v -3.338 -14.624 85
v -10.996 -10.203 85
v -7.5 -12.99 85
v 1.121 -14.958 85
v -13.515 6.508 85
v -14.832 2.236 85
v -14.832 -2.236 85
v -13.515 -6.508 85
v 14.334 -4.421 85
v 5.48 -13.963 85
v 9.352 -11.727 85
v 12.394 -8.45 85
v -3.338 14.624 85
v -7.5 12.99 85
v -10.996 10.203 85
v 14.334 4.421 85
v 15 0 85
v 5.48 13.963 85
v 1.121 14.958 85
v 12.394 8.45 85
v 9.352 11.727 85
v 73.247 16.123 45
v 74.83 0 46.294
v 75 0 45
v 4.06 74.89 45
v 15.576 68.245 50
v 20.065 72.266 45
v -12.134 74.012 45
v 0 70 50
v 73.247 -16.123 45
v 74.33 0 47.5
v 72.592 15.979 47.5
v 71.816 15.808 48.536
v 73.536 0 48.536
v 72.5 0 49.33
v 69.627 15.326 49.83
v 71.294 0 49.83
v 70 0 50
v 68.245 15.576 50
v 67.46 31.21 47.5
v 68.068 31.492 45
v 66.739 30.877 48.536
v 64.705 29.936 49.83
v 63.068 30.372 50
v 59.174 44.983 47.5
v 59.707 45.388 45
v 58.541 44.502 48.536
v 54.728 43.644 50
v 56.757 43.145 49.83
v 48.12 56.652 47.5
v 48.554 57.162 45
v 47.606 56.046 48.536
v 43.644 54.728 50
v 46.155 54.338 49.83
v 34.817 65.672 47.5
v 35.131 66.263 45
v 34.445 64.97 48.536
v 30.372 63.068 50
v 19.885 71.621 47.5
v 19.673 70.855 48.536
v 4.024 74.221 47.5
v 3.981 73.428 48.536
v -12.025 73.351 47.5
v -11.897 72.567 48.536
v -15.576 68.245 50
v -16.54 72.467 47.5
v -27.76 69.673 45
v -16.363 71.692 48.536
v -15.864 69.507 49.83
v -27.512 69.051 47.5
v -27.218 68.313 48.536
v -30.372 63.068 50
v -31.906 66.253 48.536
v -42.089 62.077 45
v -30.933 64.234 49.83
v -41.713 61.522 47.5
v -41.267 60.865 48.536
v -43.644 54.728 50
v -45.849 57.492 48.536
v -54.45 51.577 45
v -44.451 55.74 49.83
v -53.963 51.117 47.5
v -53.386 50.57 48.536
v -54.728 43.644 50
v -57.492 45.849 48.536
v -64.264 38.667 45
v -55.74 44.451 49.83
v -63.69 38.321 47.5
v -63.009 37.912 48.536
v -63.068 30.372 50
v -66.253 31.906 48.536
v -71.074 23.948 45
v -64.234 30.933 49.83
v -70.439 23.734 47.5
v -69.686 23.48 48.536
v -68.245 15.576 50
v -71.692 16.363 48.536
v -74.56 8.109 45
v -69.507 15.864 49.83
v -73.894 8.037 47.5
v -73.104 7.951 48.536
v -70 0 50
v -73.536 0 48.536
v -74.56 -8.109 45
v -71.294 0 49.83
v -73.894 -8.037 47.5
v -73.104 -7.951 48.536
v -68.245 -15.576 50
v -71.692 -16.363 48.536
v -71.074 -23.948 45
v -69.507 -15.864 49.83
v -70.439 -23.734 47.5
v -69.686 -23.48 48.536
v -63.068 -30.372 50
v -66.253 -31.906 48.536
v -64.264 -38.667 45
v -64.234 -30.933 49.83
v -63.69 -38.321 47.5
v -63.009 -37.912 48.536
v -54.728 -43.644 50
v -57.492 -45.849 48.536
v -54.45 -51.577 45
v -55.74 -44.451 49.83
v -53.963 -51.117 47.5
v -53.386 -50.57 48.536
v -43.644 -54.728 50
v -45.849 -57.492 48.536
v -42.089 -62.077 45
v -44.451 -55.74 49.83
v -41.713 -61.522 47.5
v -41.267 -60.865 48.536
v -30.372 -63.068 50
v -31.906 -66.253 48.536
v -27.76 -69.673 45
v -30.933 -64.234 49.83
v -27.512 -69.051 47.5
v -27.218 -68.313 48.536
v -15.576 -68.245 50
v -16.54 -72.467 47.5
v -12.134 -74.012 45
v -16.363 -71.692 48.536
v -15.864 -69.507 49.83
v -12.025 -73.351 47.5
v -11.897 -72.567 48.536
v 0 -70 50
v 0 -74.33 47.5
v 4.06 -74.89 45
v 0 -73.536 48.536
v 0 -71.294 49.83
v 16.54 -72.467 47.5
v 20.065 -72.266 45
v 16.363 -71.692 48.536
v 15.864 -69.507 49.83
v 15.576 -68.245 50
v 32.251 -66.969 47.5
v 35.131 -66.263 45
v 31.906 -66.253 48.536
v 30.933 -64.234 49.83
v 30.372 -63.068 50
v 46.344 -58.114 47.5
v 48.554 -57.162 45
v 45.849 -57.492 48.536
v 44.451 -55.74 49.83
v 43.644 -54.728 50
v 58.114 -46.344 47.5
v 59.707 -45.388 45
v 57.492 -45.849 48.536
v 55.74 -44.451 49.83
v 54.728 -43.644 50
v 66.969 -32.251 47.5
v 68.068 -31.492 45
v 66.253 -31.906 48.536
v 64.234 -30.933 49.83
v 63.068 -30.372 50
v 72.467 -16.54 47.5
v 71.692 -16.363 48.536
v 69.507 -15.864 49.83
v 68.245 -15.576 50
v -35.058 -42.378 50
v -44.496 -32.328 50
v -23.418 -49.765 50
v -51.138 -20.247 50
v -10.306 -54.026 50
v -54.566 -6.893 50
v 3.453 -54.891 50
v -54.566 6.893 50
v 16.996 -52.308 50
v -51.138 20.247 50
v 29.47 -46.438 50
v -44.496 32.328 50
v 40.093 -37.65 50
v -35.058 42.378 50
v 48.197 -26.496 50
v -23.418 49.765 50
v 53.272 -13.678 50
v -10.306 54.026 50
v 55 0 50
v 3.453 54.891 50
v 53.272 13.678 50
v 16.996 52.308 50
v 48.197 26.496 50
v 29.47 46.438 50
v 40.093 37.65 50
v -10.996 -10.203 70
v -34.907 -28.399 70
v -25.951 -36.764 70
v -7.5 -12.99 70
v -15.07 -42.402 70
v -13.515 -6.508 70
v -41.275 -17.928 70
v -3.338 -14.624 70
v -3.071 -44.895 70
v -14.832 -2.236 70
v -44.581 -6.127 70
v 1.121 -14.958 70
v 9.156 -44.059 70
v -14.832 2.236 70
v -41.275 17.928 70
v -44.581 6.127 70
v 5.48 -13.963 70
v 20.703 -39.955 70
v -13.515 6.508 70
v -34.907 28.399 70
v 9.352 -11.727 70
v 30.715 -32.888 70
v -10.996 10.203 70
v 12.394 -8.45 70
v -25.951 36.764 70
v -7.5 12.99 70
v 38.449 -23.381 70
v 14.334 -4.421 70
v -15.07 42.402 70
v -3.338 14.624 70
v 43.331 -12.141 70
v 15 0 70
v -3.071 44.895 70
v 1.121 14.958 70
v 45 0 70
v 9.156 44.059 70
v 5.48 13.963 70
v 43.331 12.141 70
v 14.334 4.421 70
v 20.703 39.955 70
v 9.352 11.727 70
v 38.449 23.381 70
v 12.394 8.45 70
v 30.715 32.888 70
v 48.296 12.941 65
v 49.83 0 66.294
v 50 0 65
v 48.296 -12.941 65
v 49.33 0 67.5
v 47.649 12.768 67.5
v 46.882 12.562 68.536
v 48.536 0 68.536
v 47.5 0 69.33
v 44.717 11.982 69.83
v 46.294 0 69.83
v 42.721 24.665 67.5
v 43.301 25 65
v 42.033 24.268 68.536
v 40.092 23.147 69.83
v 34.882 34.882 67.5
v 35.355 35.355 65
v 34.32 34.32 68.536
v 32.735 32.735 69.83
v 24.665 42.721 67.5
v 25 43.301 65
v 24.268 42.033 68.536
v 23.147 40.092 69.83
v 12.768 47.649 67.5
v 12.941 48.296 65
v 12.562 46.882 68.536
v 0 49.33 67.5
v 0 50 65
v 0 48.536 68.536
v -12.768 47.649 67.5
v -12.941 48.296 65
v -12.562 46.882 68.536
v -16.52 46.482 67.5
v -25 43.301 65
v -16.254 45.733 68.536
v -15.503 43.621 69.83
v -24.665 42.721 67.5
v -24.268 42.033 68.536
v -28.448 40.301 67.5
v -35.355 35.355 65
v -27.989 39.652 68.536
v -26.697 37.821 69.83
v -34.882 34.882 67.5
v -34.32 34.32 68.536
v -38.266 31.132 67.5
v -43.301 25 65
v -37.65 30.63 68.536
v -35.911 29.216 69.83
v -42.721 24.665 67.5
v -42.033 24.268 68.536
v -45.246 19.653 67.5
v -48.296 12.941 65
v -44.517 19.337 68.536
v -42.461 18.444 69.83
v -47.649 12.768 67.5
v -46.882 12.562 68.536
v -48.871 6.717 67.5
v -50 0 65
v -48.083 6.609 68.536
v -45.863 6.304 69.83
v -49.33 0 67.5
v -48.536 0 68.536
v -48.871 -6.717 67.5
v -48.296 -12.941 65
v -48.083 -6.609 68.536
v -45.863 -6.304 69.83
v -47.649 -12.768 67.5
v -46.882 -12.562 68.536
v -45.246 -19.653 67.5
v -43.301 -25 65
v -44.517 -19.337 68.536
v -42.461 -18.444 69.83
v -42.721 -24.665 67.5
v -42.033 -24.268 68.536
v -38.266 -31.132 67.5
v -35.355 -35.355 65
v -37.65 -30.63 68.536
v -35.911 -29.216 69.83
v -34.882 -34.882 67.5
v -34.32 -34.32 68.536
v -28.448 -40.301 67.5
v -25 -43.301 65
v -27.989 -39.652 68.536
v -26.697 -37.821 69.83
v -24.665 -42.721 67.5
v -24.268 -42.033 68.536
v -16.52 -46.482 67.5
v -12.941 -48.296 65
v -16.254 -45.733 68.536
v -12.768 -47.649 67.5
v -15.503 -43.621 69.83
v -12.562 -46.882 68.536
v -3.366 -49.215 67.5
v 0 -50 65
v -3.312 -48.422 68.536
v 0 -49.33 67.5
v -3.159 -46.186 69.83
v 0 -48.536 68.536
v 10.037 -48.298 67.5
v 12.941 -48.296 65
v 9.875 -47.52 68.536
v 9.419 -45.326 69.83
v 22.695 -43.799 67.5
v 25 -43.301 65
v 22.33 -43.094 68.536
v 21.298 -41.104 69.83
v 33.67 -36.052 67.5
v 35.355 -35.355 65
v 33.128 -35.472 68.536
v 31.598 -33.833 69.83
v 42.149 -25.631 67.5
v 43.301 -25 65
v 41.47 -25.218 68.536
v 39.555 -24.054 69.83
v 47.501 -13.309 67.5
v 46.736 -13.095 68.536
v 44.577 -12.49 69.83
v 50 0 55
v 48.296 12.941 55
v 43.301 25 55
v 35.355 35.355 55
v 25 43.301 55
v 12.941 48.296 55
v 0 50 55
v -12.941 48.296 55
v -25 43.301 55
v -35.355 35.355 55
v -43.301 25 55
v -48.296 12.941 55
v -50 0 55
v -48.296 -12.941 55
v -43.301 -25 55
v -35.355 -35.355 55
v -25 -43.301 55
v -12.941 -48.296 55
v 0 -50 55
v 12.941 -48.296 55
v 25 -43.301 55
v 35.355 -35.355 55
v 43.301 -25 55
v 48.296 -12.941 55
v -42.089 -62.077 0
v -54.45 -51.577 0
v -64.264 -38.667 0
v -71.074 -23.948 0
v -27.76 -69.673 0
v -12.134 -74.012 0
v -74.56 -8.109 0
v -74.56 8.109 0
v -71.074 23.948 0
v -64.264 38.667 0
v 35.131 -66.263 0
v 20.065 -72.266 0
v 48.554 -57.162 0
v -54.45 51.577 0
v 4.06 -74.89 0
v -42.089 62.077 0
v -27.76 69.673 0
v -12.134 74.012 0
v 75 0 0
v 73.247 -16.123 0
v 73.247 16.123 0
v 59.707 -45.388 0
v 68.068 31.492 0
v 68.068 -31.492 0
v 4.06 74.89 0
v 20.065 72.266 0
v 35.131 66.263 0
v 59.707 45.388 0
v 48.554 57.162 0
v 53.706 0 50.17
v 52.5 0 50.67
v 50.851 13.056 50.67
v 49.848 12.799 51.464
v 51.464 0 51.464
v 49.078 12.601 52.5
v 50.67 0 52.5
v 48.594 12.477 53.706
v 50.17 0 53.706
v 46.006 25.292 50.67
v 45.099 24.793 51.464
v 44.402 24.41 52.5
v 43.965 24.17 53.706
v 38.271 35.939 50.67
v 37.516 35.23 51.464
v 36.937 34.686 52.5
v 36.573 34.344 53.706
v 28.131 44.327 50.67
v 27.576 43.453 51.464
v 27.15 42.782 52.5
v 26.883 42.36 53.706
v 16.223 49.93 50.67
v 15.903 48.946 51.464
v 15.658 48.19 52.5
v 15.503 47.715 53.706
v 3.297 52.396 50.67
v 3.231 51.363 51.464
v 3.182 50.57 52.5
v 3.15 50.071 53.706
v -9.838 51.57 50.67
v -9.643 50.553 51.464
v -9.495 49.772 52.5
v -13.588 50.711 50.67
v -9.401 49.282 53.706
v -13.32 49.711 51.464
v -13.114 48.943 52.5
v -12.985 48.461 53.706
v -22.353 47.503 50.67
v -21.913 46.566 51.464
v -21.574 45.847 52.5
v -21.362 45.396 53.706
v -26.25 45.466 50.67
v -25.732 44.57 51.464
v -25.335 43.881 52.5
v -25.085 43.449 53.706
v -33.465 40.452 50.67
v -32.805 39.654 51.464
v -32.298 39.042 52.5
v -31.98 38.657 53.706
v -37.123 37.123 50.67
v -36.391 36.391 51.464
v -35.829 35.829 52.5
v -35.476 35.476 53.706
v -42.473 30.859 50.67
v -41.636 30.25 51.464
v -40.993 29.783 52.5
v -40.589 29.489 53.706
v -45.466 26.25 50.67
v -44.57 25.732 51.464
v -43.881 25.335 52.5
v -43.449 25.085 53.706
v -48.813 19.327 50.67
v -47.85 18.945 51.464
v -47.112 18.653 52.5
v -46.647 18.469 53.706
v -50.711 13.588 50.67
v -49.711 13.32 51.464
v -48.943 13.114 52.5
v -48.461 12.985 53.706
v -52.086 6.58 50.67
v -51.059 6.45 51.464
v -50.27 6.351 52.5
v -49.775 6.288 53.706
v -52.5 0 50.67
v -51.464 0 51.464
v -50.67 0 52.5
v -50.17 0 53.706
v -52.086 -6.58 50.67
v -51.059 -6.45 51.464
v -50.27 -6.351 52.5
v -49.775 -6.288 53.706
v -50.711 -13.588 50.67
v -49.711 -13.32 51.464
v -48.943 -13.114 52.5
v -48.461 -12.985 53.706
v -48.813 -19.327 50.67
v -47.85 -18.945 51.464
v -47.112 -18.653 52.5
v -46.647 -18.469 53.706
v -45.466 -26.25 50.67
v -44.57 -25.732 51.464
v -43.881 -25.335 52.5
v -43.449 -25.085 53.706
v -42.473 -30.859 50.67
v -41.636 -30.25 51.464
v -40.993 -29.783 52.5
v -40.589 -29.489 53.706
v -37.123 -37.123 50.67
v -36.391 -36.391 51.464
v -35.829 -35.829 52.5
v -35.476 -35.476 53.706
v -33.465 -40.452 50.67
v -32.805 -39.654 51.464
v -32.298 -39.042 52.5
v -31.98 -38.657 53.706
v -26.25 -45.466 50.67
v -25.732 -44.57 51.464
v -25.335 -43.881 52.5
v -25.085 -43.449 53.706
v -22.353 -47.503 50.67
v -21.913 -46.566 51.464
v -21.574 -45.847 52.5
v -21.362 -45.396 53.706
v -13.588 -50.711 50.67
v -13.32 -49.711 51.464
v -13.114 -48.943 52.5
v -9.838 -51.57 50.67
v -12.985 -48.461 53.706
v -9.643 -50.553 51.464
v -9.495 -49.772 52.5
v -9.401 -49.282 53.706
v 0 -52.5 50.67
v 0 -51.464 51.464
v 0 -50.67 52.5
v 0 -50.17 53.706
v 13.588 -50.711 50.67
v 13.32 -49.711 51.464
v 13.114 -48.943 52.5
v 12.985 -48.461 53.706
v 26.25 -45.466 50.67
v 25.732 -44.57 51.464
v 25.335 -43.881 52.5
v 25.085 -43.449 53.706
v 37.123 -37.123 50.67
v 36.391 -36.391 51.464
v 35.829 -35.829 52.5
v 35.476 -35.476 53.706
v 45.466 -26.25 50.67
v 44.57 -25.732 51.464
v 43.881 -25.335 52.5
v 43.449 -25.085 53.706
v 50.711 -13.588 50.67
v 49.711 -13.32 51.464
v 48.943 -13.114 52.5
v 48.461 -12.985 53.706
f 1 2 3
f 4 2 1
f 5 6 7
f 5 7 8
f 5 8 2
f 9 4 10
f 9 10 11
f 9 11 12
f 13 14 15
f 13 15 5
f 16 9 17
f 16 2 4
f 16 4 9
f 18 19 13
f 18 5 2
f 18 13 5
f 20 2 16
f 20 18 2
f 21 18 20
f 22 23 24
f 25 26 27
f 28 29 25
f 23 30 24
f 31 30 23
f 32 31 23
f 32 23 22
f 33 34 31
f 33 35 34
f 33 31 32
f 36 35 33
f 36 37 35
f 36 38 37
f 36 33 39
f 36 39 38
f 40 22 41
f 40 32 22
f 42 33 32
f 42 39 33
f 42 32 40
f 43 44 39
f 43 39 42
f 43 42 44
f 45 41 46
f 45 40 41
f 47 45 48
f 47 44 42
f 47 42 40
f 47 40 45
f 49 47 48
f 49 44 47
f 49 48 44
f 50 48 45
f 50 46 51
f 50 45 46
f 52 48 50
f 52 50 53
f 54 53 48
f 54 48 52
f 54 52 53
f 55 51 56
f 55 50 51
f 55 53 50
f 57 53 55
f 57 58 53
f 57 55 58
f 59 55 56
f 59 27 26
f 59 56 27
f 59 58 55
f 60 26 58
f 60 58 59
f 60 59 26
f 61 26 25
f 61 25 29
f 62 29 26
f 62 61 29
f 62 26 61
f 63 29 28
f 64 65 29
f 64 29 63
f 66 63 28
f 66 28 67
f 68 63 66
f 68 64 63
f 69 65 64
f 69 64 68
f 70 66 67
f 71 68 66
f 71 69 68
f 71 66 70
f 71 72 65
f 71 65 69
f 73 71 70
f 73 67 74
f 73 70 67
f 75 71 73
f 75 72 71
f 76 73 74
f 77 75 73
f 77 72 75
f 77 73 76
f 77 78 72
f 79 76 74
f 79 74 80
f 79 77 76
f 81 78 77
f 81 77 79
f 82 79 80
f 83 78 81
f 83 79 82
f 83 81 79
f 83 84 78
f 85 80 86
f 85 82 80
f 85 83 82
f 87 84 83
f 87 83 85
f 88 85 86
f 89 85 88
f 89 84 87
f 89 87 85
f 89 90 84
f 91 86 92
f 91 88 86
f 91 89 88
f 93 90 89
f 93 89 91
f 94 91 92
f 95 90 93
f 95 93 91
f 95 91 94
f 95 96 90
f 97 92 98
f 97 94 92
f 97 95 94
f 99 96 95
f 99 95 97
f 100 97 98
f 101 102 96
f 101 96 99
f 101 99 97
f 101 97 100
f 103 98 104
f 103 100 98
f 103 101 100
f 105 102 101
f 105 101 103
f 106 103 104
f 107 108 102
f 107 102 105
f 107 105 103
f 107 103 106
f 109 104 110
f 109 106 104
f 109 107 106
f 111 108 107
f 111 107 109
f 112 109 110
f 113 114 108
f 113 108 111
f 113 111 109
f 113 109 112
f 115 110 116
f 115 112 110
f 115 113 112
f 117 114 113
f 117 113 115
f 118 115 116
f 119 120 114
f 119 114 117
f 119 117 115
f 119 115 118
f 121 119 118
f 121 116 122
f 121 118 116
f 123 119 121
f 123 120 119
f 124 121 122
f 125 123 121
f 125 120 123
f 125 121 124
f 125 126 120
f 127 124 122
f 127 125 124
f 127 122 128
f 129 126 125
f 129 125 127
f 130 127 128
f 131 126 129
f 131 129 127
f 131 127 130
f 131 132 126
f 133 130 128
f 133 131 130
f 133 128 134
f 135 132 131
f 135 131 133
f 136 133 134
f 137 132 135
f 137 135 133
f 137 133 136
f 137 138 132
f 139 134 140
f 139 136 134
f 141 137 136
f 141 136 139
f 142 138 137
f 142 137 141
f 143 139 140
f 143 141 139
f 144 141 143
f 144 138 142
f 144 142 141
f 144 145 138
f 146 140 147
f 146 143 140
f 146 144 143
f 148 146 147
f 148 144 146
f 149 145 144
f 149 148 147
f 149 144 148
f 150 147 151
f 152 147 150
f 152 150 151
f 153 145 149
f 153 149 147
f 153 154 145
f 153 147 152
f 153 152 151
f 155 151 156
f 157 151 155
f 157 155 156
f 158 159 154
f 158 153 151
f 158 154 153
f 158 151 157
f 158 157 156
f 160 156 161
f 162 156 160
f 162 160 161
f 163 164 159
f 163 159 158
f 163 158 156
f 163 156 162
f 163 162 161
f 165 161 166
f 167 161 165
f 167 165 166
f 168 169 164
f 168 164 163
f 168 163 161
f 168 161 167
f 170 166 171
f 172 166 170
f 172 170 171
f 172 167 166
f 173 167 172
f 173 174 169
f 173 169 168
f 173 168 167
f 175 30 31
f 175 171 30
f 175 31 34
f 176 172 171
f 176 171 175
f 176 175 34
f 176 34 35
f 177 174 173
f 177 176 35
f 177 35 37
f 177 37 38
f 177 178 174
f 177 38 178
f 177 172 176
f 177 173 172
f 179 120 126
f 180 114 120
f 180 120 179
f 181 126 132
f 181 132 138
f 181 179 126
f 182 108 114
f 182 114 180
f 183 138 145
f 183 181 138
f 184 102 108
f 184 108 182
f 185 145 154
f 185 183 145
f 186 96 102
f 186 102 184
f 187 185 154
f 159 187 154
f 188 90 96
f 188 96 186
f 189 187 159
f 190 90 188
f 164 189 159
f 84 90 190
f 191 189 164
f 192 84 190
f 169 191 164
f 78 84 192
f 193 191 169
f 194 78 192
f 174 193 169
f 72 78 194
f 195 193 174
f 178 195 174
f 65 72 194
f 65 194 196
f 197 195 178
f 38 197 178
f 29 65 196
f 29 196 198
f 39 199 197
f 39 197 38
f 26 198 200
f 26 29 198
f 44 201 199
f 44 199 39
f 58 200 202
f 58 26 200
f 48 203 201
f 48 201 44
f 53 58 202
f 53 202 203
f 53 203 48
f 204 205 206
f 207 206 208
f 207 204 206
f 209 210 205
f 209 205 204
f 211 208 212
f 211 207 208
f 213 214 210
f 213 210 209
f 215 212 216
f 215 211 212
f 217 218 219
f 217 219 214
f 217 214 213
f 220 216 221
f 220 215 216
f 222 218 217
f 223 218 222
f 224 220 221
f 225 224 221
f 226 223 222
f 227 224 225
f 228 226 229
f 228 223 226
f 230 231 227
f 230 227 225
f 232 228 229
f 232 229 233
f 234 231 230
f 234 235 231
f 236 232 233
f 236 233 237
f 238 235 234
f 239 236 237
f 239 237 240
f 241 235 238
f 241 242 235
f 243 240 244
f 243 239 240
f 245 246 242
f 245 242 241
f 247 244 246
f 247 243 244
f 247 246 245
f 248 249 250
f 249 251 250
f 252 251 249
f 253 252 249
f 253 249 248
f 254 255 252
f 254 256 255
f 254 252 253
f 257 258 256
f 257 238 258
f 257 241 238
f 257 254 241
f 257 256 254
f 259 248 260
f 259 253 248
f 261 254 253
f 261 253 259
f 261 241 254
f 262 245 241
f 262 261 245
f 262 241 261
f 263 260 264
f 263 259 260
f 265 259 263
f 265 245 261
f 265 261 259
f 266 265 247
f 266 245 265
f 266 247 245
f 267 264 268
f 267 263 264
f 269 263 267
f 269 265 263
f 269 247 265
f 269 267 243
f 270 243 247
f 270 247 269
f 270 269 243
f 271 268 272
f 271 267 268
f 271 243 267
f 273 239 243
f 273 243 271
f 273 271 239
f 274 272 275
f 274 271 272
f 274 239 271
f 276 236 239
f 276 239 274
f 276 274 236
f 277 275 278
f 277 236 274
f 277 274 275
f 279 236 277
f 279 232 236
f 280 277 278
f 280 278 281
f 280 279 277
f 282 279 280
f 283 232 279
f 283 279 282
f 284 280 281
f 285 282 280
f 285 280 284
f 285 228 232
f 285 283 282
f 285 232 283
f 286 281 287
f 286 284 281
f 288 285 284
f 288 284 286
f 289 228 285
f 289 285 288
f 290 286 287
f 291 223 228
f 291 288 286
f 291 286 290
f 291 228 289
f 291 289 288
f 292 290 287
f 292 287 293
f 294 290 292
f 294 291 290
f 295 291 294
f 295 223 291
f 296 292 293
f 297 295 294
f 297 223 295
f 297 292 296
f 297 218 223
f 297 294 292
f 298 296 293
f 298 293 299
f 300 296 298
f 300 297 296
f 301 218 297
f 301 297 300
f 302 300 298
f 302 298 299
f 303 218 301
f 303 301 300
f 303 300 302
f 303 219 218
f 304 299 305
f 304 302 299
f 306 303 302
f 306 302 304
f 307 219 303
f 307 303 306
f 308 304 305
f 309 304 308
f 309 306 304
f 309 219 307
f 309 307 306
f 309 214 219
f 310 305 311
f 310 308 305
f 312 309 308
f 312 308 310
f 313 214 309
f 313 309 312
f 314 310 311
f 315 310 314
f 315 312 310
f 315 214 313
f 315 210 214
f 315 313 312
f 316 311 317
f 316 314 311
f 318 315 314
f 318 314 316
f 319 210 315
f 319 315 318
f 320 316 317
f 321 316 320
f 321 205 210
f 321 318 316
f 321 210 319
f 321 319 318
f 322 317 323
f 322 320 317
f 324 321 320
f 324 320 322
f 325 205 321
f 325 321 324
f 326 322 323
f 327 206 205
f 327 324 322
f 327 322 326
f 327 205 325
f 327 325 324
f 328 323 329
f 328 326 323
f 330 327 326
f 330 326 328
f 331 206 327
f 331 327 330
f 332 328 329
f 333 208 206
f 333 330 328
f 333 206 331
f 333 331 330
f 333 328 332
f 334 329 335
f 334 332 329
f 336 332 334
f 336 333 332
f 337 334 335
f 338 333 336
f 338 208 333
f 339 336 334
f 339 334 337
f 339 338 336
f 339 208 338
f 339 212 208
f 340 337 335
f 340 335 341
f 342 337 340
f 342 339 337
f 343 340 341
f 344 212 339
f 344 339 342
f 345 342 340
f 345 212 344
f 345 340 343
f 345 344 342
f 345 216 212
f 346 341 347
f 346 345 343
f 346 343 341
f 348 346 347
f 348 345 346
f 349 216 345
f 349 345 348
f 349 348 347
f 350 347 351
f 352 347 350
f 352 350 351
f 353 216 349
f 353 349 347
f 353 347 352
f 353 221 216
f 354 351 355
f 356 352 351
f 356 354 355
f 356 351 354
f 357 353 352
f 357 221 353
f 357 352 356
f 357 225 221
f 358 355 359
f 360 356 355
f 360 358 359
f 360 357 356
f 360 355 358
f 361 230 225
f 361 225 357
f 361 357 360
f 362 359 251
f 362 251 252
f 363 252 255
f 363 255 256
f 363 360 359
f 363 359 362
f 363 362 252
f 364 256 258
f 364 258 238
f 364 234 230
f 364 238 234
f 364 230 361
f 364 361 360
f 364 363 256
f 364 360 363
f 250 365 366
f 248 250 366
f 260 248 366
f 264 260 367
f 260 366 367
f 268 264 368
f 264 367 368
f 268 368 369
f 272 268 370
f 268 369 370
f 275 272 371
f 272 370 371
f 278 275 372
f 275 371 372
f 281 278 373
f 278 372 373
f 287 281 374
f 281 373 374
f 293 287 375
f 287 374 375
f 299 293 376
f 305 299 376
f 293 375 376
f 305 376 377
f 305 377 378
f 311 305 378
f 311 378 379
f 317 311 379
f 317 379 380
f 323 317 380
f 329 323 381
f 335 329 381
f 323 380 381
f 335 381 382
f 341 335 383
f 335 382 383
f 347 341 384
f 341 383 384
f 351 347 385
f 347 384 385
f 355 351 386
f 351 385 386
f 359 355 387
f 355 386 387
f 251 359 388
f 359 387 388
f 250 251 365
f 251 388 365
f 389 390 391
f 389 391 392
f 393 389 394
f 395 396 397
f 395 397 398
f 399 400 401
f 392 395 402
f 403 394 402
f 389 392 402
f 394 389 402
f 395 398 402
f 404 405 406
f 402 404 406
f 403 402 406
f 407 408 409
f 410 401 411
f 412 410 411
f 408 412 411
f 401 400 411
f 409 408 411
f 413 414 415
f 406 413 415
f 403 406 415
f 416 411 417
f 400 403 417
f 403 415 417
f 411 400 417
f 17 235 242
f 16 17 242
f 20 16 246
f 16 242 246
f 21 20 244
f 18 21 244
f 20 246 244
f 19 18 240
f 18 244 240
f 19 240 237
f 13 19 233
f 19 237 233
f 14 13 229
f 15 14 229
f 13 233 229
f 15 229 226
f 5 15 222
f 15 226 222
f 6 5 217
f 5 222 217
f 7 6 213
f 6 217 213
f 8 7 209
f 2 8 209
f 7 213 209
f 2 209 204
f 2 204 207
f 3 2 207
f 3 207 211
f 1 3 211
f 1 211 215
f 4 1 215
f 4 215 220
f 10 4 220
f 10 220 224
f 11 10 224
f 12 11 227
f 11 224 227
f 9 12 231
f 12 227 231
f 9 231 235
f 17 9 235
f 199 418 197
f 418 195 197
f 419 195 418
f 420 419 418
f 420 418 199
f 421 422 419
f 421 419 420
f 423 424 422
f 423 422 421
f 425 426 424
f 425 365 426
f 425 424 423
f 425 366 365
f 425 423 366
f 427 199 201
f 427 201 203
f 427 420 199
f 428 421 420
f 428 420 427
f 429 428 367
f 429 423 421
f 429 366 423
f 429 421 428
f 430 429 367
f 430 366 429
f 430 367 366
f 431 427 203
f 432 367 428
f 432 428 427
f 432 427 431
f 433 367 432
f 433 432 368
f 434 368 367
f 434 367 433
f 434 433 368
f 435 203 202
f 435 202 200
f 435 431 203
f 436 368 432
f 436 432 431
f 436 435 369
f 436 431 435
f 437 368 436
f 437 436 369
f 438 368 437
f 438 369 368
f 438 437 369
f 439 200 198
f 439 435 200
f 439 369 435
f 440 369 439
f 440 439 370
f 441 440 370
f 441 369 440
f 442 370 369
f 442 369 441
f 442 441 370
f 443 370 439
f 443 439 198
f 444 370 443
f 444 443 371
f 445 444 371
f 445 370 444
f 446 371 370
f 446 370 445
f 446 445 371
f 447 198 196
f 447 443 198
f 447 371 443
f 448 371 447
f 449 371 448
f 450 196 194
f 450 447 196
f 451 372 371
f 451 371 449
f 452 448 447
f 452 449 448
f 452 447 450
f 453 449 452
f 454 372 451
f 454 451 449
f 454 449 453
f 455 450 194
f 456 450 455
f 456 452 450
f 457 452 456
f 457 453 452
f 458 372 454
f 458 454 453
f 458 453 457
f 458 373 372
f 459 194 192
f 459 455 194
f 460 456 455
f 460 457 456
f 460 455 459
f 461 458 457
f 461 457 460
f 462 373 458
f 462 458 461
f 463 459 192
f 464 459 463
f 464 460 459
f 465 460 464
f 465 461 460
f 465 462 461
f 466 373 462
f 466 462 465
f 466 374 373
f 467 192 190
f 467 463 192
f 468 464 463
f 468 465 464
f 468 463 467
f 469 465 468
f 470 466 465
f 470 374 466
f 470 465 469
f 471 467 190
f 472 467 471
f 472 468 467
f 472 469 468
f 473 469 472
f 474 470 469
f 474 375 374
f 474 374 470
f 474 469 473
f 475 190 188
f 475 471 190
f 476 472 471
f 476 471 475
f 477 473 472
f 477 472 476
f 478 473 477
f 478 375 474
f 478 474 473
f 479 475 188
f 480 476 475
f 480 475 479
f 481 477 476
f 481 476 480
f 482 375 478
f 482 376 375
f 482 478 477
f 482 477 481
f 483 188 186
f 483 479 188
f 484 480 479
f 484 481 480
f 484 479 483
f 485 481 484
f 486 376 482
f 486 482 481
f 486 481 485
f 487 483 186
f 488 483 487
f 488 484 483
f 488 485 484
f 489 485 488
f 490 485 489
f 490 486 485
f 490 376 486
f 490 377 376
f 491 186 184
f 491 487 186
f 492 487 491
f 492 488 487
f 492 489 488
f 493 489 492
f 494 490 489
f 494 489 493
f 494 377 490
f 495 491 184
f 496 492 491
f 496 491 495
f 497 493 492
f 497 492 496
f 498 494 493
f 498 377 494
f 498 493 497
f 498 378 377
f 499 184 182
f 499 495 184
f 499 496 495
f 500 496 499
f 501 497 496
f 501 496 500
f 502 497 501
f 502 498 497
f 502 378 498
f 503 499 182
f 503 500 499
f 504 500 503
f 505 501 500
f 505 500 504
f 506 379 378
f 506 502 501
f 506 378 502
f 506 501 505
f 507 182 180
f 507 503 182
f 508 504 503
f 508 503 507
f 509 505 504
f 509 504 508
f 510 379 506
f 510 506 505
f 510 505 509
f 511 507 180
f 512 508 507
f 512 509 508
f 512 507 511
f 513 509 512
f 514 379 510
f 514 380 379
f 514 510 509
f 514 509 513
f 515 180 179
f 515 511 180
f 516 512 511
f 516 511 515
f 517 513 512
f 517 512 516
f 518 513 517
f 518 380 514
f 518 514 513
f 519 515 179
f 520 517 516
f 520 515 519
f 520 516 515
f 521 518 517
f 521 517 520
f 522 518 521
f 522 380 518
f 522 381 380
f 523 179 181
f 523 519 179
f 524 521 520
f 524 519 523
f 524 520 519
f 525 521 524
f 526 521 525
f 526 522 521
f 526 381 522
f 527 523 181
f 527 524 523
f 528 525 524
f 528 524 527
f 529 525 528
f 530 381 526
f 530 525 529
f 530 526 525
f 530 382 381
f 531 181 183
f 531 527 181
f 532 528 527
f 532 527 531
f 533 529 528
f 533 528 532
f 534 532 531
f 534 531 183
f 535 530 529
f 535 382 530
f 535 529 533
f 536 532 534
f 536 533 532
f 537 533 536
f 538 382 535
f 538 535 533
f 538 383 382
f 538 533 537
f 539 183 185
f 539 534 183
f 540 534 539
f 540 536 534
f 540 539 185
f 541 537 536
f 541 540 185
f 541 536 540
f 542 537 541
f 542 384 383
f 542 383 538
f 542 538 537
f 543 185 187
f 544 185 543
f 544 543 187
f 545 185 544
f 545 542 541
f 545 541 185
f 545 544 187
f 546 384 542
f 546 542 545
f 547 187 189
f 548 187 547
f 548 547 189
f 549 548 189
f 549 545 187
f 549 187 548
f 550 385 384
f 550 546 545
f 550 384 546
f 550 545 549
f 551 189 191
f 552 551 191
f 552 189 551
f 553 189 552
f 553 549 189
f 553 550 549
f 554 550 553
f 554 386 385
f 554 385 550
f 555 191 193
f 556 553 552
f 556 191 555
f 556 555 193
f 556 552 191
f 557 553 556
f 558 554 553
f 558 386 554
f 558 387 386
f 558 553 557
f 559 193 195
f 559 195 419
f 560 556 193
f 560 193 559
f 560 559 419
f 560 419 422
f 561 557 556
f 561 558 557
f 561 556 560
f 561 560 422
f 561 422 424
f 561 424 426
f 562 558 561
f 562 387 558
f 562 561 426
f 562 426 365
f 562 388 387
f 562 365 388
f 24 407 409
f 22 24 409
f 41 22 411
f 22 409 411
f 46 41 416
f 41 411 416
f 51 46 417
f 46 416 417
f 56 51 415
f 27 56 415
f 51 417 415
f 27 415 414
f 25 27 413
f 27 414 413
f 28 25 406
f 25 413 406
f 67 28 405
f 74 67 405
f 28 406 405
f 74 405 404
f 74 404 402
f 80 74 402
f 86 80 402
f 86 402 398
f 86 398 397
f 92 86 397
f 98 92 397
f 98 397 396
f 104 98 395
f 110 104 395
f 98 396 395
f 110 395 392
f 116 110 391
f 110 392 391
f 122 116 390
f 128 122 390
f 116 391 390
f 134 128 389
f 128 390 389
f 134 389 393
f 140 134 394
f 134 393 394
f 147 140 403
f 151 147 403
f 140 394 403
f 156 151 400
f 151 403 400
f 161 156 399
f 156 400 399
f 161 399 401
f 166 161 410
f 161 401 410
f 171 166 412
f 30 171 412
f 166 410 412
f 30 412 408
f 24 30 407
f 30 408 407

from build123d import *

# Parameters (mm, degrees)
SKETCH1_R           = 75
BOSS_EXTRUDE1_DEPTH = 50
SKETCH2_R           = 50
BOSS_EXTRUDE2_DEPTH = 20
SKETCH3_R           = 15
BOSS_EXTRUDE3_DEPTH = 15
FILLET1_R           = 5


with BuildPart() as part:
    # Sketch1 → Boss-Extrude1 (new body)
    with BuildSketch(Plane.XY):
        Circle(SKETCH1_R)
    extrude(amount=BOSS_EXTRUDE1_DEPTH)

    # Sketch2 → Boss-Extrude2 (add)
    with BuildSketch(Plane.XY.offset(50)):
        Circle(SKETCH2_R)
    extrude(amount=BOSS_EXTRUDE2_DEPTH)

    # Sketch3 → Boss-Extrude3 (add)
    with BuildSketch(Plane.XY.offset(70)):
        Circle(SKETCH3_R)
    extrude(amount=BOSS_EXTRUDE3_DEPTH)

    # Fillet1
    fillet1_edges = [part.edges().sort_by_distance(p)[0] for p in [
        (-75, 0, 50),
        (-50, 0, 50),
        (-50, 0, 70),
    ]]
    fillet(fillet1_edges, radius=FILLET1_R)


solid = part.part
